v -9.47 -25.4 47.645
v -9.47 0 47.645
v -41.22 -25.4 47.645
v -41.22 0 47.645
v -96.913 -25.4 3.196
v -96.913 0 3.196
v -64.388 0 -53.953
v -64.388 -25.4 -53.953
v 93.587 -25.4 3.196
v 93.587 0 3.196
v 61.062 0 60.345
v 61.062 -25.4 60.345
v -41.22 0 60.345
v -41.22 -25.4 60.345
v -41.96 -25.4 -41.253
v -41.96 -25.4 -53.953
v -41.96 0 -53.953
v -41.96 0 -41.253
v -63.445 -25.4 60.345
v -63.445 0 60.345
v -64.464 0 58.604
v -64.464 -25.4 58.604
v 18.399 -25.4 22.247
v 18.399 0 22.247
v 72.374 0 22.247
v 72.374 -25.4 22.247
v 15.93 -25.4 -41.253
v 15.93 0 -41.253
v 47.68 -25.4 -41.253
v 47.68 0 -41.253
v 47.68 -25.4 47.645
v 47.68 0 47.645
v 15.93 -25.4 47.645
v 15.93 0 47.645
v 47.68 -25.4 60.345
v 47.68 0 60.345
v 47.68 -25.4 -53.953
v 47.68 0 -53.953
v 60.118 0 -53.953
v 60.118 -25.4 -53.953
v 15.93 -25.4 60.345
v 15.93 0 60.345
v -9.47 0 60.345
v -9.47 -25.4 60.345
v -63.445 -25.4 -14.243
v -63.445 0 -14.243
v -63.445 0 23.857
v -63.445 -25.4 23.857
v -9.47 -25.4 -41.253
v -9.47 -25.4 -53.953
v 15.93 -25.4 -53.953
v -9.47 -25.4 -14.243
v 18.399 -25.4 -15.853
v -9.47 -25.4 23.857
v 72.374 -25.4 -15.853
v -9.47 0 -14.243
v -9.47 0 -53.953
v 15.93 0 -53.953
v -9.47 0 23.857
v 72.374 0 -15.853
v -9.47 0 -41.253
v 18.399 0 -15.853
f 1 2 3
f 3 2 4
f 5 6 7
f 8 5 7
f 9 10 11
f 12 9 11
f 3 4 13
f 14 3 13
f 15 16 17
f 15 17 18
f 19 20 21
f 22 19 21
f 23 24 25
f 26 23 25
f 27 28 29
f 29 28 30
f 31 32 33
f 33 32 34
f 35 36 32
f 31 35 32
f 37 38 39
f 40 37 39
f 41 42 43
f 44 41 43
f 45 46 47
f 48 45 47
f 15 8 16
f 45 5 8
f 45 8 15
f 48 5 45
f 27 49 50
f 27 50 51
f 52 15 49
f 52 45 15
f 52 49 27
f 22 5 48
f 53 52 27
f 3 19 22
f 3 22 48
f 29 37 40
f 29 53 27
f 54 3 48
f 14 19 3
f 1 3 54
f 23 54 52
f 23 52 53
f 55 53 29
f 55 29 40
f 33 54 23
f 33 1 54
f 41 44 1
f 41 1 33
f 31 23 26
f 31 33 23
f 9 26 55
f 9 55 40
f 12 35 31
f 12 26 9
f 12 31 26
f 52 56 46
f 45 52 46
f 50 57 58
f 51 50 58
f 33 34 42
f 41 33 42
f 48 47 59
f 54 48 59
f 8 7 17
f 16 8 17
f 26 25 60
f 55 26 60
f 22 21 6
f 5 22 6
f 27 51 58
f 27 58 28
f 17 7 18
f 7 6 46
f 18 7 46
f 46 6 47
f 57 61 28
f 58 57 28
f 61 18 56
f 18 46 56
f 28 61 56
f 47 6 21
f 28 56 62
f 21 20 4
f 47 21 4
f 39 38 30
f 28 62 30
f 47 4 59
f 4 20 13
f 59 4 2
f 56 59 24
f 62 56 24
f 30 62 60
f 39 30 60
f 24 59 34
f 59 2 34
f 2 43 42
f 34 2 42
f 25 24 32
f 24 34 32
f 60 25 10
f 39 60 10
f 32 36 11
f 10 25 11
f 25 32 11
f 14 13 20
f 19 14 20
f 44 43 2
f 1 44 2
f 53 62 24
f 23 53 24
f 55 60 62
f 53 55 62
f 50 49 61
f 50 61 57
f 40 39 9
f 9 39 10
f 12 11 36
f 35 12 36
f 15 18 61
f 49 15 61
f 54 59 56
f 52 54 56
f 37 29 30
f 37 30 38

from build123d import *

# Parameters (mm, degrees)
F1_DEPTH = 25.4


with BuildPart() as f1:
    # F0 (on Front) → F1 (new body)
    with BuildSketch(Plane.XZ):
        Polygon((-41.2195250034, 60.3447593749), (-63.4445250034, 60.3447593749), (-64.4639437478, 58.6040624199), (-96.9131098717, 3.1958555594), (-64.3884492879, -53.953048256), (-41.960131377, -53.953048256), (-41.960131377, -41.253048256), (-9.4695250034, -41.253048256), (-9.4695250034, -53.953048256), (15.9304749966, -53.953048256), (15.9304749966, -41.253048256), (47.6804749966, -41.253048256), (47.6804749966, -53.953048256), (60.11830526, -53.953048256), (93.5868901283, 3.1958555594), (61.0622295445, 60.3447593749), (47.6804749966, 60.3447593749), (47.6804749966, 47.6447593749), (15.9304749966, 47.6447593749), (15.9304749966, 60.3447593749), (-9.4695250034, 60.3447593749), (-9.4695250034, 47.6447593749), (-41.2195250034, 47.6447593749), align=None)
        Polygon((-53.7397041917, 23.8567902654), (-9.4695250034, 23.8567902654), (-9.4695250034, -14.2432097346), (-63.4445250034, -14.2432097346), (-63.4445250034, 23.8567902654), align=None, mode=Mode.SUBTRACT)
        Polygon((18.3994676918, -15.853048256), (18.3994676918, 22.246951744), (56.8952597678, 22.246951744), (72.3744676918, 22.246951744), (72.3744676918, -15.853048256), align=None, mode=Mode.SUBTRACT)
    extrude(amount=F1_DEPTH)


solid = f1.part
